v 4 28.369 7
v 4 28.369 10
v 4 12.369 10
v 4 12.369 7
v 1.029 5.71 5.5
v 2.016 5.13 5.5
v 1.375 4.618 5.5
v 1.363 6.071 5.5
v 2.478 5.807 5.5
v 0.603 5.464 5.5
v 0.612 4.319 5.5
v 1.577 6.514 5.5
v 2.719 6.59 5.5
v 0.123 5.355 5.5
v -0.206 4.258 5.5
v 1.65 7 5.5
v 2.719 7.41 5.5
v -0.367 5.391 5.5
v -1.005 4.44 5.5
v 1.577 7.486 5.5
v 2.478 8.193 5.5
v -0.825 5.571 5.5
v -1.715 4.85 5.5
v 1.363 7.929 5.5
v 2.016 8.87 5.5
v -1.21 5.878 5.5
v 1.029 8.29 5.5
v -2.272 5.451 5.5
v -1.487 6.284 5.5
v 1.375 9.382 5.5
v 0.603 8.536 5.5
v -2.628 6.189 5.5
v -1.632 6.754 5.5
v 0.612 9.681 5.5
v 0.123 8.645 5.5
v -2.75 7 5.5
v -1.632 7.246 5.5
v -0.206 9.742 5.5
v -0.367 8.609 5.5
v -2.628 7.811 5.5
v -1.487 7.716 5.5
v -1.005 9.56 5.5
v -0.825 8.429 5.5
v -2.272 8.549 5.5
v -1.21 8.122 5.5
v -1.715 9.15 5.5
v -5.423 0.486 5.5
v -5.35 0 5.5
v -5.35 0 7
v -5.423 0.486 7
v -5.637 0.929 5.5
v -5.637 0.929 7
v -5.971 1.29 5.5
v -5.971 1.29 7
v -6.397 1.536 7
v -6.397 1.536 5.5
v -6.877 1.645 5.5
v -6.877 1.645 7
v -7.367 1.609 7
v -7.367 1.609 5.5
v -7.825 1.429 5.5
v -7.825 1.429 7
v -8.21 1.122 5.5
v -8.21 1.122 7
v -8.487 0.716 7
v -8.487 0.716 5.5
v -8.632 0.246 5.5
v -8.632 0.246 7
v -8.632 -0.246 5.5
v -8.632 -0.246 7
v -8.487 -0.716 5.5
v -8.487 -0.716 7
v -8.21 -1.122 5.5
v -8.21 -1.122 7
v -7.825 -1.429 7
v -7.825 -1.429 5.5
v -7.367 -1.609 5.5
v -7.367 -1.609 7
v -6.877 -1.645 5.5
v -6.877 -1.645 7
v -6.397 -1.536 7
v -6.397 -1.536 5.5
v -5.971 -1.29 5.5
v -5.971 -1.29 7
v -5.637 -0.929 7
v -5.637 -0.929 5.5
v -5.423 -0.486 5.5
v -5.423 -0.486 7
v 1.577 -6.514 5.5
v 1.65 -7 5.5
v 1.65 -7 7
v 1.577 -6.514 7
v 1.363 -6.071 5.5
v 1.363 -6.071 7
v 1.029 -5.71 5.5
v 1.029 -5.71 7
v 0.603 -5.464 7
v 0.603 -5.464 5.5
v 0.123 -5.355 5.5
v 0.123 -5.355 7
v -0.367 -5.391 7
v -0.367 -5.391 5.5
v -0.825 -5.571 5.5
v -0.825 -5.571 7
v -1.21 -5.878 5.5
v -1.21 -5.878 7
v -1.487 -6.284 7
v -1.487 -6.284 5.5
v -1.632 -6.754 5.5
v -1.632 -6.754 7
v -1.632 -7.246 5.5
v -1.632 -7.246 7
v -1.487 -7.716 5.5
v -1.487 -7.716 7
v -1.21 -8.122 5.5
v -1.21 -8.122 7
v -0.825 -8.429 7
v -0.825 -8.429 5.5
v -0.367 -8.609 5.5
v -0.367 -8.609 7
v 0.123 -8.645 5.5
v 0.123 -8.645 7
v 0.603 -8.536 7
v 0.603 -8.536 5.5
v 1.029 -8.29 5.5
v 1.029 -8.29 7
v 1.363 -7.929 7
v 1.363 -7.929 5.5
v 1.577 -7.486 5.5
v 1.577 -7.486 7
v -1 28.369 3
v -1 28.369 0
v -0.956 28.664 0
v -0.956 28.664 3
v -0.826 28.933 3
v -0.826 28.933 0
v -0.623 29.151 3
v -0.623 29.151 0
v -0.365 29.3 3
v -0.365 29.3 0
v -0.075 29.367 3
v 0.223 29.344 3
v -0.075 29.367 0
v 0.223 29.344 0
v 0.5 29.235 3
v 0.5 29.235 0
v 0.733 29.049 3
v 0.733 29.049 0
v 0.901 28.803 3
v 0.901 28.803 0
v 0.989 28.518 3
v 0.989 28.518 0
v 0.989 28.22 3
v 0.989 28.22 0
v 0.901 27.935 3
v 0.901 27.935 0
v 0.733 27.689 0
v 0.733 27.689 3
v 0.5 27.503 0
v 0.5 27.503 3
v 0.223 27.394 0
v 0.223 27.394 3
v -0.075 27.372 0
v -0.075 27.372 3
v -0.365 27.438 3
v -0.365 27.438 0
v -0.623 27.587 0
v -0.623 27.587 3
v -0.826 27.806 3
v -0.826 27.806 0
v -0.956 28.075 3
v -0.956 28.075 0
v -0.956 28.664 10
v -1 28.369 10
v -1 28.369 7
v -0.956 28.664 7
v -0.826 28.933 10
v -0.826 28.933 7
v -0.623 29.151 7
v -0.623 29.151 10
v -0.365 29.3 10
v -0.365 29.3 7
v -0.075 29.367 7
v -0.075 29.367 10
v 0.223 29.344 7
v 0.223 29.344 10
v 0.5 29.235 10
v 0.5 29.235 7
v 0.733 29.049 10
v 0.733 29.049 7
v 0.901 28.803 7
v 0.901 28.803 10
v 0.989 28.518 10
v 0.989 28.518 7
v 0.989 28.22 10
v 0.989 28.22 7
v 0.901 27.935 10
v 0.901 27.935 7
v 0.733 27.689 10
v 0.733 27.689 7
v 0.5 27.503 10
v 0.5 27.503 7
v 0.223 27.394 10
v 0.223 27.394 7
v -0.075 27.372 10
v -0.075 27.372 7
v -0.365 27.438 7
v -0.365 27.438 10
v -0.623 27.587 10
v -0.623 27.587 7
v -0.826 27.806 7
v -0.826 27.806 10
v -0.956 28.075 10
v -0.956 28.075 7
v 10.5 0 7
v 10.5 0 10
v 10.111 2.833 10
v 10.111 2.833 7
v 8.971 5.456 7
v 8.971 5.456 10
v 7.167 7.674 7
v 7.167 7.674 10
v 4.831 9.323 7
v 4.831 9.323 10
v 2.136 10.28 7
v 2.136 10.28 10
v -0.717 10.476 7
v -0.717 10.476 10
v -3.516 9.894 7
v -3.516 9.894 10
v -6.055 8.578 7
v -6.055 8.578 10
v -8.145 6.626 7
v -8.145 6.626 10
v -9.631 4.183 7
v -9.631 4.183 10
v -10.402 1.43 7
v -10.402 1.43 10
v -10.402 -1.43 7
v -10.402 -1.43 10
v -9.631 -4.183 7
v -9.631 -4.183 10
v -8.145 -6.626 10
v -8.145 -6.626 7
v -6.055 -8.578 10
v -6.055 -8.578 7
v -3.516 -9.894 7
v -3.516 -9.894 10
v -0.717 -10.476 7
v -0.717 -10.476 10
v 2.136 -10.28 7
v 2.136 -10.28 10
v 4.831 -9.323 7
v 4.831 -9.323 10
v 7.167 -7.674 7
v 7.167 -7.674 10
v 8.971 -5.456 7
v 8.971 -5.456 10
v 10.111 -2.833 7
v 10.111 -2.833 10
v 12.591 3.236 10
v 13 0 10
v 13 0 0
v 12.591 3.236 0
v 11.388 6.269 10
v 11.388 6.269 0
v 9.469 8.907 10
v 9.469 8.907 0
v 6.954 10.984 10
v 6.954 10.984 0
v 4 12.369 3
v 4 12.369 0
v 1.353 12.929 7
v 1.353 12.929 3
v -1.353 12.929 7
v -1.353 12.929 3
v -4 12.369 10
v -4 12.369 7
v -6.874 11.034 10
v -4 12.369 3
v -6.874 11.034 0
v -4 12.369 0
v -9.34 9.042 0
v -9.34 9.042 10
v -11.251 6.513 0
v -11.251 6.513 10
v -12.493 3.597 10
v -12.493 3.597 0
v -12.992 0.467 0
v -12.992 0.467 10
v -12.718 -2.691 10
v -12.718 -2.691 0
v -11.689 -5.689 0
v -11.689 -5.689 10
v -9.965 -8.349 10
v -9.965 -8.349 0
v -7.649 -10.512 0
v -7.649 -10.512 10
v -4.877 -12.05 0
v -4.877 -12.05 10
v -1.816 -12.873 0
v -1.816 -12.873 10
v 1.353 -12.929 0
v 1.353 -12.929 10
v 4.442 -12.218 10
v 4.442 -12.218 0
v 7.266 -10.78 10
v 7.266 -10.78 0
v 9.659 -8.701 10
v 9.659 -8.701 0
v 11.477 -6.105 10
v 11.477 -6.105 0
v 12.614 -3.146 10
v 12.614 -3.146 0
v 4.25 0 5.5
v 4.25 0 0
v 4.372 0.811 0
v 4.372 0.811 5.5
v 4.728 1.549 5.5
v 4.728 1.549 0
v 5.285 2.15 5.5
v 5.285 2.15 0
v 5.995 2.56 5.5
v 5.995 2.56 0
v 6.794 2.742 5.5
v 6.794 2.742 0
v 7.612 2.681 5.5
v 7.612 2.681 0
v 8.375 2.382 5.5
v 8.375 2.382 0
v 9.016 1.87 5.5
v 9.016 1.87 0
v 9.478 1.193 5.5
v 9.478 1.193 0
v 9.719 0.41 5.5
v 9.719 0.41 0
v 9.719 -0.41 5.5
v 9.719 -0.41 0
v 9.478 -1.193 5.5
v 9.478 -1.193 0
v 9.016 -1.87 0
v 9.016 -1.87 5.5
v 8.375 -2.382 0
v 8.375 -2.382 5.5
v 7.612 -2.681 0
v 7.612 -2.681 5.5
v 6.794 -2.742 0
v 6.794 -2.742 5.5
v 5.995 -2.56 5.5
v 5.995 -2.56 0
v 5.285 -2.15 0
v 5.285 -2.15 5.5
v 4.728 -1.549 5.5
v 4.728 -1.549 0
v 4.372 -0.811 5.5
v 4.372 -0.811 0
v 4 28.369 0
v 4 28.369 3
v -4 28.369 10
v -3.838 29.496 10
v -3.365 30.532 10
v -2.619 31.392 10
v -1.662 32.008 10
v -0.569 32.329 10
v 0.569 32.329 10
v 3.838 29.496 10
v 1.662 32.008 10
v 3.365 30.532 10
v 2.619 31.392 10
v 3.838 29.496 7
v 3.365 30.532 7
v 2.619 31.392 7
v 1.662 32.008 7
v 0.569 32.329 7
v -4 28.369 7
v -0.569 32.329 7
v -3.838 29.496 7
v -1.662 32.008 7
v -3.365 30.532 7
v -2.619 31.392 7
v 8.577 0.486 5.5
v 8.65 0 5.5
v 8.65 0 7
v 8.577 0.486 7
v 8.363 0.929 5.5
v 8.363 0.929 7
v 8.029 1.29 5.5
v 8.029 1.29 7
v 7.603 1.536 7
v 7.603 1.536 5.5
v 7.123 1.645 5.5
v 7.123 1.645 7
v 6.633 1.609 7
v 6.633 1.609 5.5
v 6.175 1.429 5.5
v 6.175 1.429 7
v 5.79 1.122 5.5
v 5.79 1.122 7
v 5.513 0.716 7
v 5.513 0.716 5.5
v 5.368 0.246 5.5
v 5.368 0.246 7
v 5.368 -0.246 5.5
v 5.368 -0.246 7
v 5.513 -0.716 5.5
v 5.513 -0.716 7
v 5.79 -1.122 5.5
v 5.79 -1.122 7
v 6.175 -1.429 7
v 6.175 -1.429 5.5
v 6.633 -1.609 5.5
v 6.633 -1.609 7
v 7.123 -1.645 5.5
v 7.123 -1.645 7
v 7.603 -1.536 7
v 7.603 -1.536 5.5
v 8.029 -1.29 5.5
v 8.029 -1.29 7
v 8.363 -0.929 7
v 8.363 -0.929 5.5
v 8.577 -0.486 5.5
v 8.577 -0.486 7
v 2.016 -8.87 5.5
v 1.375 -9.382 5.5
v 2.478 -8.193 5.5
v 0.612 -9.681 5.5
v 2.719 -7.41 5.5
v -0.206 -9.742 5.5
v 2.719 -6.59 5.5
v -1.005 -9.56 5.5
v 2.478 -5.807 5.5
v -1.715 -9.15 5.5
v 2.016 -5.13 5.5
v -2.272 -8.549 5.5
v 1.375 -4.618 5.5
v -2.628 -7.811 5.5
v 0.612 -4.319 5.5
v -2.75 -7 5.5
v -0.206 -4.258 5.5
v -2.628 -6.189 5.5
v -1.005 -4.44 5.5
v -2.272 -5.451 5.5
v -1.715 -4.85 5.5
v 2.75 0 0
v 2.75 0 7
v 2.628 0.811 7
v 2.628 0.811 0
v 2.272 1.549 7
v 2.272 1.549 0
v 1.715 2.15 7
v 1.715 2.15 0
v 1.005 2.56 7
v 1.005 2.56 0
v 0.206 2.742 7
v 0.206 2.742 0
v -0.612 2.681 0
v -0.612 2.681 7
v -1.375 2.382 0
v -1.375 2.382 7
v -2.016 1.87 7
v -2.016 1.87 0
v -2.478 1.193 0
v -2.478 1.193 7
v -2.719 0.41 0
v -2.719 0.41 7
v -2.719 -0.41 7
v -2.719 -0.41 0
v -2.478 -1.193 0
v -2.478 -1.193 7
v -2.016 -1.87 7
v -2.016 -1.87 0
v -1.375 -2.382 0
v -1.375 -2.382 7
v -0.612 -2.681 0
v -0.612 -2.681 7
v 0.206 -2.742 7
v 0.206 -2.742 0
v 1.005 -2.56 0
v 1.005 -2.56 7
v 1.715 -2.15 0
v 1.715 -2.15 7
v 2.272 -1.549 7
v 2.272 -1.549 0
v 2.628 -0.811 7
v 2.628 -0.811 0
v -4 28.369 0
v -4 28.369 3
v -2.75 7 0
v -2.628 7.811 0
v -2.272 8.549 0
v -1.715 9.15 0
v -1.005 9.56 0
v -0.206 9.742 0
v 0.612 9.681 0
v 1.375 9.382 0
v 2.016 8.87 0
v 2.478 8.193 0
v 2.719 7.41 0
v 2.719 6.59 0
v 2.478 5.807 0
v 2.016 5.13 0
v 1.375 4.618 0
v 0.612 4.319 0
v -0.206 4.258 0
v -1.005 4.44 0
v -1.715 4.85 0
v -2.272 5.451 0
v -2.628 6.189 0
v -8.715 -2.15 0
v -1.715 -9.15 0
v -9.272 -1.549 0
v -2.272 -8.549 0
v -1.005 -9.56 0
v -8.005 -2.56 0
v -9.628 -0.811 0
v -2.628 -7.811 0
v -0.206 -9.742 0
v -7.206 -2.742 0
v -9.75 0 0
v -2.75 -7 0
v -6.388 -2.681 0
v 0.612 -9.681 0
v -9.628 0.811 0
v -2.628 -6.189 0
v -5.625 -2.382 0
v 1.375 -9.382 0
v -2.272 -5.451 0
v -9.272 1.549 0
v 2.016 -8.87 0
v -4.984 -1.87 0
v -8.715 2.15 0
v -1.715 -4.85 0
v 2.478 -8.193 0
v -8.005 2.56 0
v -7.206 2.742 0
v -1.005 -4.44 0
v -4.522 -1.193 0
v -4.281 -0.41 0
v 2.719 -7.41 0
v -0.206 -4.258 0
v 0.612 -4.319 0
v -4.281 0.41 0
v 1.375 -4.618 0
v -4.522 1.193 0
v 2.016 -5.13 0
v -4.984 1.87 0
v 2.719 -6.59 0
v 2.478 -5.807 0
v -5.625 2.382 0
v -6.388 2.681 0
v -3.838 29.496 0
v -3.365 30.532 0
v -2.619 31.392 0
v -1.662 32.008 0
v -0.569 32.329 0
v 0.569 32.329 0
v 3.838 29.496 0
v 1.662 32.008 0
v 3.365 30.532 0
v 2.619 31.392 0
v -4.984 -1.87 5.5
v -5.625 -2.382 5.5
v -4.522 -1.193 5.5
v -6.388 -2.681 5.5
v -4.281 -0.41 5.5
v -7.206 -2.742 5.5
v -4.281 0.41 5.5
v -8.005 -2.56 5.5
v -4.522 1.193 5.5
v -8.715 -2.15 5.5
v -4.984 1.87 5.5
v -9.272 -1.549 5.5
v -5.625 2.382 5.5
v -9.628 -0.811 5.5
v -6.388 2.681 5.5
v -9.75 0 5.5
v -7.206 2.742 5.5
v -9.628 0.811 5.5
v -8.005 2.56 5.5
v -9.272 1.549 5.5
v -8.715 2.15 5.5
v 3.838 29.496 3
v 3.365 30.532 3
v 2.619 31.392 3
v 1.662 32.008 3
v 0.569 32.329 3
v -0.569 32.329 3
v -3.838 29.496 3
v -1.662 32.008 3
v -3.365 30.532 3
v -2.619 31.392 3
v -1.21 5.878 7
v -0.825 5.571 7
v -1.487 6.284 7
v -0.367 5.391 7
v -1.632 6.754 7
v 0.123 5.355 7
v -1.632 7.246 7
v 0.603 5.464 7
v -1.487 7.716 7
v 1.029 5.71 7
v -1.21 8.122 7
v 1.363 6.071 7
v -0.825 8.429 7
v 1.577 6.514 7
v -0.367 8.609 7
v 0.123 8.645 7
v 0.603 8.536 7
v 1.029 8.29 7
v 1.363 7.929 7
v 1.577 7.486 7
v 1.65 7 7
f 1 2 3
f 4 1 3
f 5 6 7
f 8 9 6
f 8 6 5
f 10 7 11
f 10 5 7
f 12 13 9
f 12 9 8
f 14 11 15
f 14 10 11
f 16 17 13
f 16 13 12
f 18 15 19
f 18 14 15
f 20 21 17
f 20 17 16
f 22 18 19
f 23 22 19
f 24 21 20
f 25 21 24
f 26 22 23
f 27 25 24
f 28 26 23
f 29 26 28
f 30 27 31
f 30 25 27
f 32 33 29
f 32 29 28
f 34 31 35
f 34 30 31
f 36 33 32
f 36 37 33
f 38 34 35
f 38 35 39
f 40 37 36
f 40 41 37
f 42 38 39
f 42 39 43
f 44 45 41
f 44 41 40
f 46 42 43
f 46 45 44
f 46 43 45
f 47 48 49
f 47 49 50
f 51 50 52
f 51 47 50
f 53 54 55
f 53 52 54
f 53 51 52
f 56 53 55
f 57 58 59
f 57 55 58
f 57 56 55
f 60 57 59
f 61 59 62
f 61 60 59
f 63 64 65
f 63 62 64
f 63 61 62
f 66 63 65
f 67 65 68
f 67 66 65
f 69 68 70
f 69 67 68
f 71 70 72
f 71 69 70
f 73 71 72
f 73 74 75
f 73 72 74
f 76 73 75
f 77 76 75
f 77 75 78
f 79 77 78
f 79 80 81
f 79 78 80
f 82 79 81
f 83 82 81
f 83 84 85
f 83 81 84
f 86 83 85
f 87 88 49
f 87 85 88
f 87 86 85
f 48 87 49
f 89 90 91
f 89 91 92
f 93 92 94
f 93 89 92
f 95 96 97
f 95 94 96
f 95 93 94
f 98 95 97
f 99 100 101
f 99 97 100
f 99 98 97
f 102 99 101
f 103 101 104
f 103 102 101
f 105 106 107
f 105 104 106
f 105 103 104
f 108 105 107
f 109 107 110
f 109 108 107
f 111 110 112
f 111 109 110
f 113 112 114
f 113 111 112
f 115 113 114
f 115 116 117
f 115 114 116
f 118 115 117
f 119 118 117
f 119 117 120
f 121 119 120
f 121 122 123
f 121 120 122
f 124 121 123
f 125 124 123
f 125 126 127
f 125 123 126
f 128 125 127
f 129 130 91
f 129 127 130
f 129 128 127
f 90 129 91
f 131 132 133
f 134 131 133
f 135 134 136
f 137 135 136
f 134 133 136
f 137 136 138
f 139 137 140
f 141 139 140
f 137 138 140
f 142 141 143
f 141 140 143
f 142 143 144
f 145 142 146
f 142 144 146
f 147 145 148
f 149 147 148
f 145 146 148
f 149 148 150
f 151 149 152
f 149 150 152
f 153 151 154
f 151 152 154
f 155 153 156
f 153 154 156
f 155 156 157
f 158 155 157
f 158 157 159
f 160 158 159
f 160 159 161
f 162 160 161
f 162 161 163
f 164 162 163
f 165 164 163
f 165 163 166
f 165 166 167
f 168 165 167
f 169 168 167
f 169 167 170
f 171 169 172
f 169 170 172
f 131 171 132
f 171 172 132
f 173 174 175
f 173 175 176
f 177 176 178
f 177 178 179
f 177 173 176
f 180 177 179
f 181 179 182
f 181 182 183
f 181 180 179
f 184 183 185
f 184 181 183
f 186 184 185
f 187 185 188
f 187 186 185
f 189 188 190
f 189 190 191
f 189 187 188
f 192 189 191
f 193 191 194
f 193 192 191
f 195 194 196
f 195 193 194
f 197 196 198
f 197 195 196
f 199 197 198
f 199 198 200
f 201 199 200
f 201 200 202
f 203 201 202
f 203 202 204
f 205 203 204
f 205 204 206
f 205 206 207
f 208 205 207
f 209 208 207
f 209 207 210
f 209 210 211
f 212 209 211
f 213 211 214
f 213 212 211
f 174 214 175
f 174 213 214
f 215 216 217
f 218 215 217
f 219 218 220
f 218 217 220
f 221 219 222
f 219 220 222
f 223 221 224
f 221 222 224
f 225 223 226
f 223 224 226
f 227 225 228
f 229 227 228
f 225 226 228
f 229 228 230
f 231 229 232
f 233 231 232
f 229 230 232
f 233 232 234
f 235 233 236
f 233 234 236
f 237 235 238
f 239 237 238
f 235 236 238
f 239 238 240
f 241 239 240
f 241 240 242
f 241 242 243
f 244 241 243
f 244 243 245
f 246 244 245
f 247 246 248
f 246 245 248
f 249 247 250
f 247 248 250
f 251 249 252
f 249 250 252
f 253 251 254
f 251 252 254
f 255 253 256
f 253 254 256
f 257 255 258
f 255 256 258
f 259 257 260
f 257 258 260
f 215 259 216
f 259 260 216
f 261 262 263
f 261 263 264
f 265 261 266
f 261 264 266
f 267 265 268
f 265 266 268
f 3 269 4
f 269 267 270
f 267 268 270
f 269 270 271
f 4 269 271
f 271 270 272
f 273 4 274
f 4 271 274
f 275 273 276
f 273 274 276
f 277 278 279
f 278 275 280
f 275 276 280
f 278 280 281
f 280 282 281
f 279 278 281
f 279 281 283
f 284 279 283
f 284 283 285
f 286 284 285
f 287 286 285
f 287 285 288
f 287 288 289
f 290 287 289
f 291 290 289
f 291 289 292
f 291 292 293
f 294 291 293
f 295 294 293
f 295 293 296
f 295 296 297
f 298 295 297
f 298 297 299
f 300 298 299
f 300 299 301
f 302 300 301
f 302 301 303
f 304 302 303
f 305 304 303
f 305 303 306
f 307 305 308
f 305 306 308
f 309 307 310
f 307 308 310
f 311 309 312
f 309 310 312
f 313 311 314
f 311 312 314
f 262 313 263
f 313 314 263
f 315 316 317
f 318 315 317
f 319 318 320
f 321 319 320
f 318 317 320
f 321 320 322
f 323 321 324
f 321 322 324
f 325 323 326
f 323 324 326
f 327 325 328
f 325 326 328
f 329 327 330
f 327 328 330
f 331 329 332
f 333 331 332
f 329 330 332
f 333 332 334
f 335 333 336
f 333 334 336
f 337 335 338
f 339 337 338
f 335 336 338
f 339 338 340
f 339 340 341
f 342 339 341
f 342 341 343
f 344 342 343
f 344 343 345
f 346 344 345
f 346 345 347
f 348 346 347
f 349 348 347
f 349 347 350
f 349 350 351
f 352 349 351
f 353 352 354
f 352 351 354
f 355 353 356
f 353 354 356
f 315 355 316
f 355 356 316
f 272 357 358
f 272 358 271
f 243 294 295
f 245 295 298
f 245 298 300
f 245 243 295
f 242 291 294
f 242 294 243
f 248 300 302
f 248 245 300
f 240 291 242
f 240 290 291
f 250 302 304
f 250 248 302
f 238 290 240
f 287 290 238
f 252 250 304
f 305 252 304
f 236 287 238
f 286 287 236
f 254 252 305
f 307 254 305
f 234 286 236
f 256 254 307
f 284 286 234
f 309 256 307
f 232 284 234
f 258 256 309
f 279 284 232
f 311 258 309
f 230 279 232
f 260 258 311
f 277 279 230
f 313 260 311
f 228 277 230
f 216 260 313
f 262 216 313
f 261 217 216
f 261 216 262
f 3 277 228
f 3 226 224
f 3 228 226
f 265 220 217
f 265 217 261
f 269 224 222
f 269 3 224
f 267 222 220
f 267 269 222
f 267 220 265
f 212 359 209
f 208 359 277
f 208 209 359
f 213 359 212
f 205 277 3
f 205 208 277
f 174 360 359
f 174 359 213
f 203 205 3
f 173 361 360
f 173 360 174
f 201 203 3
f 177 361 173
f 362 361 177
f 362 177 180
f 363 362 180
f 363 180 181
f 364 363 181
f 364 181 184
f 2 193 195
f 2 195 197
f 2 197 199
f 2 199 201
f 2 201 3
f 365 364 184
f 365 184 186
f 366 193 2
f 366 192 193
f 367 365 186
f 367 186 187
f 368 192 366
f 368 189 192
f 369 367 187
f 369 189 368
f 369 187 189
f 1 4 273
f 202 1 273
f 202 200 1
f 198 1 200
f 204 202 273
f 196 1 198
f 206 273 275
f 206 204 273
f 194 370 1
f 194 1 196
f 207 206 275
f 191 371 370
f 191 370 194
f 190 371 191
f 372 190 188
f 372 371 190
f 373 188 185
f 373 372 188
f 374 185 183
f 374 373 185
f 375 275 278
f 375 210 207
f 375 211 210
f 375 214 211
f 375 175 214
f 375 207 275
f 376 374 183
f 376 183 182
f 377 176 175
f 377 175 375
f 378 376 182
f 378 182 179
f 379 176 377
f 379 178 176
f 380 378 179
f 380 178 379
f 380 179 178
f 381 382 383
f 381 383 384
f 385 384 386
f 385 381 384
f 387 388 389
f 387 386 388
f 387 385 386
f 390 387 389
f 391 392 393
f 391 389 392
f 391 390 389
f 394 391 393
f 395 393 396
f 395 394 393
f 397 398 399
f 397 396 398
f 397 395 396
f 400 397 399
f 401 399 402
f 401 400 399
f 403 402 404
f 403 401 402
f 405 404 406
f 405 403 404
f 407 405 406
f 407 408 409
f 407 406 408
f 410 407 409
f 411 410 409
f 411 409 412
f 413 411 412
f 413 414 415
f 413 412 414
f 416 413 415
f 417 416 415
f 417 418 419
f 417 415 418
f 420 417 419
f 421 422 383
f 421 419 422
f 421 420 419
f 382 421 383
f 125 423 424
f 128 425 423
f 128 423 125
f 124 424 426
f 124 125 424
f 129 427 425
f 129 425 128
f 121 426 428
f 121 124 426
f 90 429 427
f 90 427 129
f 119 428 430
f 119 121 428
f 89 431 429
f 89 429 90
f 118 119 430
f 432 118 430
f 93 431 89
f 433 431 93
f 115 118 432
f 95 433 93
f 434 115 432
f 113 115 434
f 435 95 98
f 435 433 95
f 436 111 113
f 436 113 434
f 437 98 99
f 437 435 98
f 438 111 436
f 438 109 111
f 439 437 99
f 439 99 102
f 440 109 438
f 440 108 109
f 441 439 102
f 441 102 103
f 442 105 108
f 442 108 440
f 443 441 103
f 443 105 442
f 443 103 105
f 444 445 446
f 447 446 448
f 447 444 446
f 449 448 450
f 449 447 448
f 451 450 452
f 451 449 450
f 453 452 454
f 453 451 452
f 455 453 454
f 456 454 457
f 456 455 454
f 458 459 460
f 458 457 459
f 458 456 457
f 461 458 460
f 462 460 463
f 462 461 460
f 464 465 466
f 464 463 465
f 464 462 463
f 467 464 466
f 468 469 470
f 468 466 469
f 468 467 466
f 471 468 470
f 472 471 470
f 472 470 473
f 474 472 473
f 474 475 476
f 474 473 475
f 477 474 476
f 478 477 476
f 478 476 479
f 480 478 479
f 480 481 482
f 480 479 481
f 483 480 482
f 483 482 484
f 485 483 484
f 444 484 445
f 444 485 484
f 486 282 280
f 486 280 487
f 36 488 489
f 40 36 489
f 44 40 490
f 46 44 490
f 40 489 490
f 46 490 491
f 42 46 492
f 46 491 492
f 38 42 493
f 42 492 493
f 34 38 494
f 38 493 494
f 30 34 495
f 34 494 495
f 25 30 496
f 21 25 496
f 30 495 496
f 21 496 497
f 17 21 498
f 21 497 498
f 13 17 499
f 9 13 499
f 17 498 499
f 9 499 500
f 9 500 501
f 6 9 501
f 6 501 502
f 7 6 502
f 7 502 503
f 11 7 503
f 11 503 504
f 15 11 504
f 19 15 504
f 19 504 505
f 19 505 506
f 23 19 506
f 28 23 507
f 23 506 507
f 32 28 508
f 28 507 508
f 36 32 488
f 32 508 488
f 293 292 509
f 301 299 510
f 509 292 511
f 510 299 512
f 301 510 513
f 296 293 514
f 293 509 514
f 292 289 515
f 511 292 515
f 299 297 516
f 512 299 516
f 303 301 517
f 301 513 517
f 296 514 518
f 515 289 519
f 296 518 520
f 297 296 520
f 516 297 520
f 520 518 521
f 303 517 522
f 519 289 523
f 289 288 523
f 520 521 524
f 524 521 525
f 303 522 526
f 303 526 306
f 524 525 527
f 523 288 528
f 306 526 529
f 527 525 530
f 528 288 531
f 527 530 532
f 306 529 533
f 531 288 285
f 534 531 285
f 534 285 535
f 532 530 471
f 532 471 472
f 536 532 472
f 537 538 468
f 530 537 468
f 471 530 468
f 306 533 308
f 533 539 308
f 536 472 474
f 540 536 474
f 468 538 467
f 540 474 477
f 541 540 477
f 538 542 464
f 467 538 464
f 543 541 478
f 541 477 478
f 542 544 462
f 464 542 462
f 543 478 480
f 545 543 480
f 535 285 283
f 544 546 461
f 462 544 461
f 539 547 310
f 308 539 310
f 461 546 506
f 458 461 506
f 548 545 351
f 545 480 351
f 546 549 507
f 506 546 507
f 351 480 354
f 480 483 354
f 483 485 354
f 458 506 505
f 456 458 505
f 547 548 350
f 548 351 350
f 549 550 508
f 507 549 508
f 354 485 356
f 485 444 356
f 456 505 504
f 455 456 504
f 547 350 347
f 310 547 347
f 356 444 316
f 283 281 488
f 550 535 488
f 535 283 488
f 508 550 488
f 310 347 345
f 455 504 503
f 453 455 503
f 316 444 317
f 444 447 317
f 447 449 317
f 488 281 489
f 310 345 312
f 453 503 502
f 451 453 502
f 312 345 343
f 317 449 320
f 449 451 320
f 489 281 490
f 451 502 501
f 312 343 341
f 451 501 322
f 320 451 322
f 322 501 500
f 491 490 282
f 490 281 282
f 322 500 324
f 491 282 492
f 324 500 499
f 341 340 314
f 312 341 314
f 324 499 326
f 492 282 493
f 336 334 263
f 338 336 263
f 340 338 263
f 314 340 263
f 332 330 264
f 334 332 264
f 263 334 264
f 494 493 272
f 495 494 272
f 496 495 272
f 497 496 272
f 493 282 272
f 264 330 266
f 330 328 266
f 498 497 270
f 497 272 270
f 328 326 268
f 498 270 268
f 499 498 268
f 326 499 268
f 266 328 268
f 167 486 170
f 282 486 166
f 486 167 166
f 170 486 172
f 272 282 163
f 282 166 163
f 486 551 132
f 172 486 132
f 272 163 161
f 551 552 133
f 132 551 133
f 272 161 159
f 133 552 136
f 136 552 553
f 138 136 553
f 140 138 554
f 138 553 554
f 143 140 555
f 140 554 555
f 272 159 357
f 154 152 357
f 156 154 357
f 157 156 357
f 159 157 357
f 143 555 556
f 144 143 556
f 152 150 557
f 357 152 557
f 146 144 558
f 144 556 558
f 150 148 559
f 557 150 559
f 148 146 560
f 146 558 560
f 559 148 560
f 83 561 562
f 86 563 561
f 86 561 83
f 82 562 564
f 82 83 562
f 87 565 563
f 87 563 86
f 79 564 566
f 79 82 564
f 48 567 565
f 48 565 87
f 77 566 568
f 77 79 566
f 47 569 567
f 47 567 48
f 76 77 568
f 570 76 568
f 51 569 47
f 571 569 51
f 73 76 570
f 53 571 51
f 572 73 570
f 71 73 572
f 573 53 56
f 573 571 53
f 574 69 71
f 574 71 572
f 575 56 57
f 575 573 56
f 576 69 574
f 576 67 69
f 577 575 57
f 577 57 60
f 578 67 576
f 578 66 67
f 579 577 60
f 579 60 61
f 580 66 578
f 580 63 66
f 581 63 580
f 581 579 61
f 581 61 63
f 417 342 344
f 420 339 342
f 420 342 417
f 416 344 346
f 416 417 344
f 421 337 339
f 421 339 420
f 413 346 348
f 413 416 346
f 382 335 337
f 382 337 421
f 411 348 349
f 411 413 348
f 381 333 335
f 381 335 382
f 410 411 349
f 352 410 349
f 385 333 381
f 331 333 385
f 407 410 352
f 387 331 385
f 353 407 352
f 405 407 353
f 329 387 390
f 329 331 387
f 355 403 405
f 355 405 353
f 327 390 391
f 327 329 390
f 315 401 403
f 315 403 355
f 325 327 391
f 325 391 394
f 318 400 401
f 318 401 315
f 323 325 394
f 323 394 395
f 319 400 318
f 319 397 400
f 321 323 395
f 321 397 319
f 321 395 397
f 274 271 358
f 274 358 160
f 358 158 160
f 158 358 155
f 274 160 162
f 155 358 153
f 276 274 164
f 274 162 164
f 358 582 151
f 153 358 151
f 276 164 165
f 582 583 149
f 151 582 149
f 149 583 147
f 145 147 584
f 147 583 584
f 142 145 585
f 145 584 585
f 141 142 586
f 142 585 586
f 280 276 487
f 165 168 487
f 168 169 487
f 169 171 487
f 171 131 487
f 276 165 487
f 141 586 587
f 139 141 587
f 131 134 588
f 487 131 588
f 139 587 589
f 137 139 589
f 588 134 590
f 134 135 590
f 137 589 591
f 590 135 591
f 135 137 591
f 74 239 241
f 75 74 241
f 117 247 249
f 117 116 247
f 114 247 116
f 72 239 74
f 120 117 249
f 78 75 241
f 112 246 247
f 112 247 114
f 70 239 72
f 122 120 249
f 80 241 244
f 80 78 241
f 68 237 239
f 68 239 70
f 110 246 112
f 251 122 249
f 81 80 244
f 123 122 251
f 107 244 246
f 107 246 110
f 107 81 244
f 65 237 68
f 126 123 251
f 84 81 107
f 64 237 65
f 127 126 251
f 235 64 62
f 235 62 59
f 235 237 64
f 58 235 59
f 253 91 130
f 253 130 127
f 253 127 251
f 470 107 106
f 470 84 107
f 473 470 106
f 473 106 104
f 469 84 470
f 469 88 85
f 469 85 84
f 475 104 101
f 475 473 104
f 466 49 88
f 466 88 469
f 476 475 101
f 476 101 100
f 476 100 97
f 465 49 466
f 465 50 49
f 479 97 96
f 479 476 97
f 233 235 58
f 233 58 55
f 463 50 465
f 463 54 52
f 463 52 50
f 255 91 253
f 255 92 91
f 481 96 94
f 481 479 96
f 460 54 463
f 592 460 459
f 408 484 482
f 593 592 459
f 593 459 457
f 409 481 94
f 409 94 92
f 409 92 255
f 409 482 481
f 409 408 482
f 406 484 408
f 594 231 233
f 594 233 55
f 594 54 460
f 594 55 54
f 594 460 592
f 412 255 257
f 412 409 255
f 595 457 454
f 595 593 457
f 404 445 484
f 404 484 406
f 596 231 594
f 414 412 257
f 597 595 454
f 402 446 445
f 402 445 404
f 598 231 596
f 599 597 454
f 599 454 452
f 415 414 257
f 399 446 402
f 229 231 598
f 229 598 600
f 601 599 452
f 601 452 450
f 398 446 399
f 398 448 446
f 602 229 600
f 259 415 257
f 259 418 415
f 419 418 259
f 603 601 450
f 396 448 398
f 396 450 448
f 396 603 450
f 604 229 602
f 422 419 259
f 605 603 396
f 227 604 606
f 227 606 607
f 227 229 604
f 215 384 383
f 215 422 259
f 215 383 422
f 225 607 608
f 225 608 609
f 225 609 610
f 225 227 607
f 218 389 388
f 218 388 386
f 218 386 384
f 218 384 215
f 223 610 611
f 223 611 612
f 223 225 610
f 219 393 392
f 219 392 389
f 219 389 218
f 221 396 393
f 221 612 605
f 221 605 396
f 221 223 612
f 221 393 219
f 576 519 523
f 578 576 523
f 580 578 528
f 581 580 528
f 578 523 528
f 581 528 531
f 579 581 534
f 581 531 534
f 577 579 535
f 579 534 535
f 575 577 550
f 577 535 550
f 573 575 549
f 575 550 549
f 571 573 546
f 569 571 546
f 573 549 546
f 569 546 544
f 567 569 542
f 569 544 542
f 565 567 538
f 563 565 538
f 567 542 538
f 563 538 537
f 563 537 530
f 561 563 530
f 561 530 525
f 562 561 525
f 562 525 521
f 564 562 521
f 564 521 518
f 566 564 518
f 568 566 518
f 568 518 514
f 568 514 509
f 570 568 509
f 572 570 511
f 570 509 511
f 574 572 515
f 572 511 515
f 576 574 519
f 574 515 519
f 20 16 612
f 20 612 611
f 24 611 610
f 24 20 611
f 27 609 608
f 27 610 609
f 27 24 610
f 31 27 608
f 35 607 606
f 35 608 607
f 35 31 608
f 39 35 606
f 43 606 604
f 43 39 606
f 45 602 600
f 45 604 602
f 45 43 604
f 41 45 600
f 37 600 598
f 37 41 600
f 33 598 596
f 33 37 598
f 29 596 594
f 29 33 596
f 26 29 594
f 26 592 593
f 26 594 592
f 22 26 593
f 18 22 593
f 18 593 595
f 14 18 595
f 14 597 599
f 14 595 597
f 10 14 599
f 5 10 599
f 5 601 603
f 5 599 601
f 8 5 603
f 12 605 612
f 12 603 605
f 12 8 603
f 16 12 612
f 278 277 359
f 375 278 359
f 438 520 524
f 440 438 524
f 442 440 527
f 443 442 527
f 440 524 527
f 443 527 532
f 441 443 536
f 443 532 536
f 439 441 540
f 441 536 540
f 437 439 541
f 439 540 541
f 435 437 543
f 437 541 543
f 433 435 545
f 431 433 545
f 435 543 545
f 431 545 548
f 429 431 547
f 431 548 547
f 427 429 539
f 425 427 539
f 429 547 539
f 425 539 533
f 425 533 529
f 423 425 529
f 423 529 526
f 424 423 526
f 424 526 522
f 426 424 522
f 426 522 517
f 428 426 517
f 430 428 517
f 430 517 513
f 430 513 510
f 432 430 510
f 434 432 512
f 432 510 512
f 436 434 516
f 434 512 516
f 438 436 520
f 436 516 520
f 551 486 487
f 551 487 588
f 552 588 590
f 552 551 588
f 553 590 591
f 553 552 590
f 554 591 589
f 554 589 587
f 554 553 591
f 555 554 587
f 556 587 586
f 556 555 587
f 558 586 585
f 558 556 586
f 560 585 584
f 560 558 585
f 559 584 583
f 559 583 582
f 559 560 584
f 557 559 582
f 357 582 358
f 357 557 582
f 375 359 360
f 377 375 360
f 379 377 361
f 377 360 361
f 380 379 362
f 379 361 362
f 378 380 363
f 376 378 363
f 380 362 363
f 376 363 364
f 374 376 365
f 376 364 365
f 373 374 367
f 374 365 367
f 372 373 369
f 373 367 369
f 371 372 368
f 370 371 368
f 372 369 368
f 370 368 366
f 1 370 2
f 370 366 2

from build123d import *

# Parameters (mm, degrees)
ESQUISSE1_R             = 13
ESQUISSE1_R_2           = 2.75
ESQUISSE1_R_3           = 1.65
BOSS_EXTRU_1_DEPTH      = 10
ESQUISSE2_R             = 10.5
ENL_V_MAT_EXTRU_1_DEPTH = 3
ESQUISSE3_R             = 2.75
ENL_V_MAT_EXTRU_2_DEPTH = 5.5
ESQUISSE4_R             = 1
BOSS_EXTRU_2_DEPTH      = 3


with BuildPart() as part:
    # Esquisse1 → Boss.-Extru.1 (new body)
    with BuildSketch(Plane.XY):
        Circle(ESQUISSE1_R)
        Circle(ESQUISSE1_R_2, mode=Mode.SUBTRACT)
        with Locations((-7, 0)):
            Circle(ESQUISSE1_R_3, mode=Mode.SUBTRACT)
        with Locations((0, 7)):
            Circle(ESQUISSE1_R_3, mode=Mode.SUBTRACT)
        with Locations((7, 0)):
            Circle(ESQUISSE1_R_3, mode=Mode.SUBTRACT)
        with Locations((0, -7)):
            Circle(ESQUISSE1_R_3, mode=Mode.SUBTRACT)
    extrude(amount=BOSS_EXTRU_1_DEPTH)

    # Esquisse2 → Enlèv. mat.-Extru.1 (cut)
    with BuildSketch(Plane.XY.offset(10)):
        Circle(ESQUISSE2_R)
    extrude(amount=-ENL_V_MAT_EXTRU_1_DEPTH, mode=Mode.SUBTRACT)

    # Esquisse3 → Enlèv. mat.-Extru.2 (cut)
    with BuildSketch(Plane(origin=(0, 0, 0), x_dir=(-1, 0, 0), z_dir=(0, 0, -1))):
        with Locations((-7, 0)):
            Circle(ESQUISSE3_R)
        with Locations((0, 7)):
            Circle(ESQUISSE3_R)
        with Locations((7, 0)):
            Circle(ESQUISSE3_R)
        with Locations((0, -7)):
            Circle(ESQUISSE3_R)
    extrude(amount=-ENL_V_MAT_EXTRU_2_DEPTH, mode=Mode.SUBTRACT)

    # Esquisse4 → Boss.-Extru.2 (add)
    with BuildSketch(Plane(origin=(0, 0, 0), x_dir=(-1, 0, 0), z_dir=(0, 0, -1))):
        with BuildLine():
            Line((-4, 28.369316877), (-4, 12.369316877))
            ThreePointArc((-4, 12.369316877), (0, 13), (4, 12.369316877))
            Line((4, 12.369316877), (4, 28.369316877))
            ThreePointArc((4, 28.369316877), (0, 32.369316877), (-4, 28.369316877))
        make_face()
        with Locations((0, 28.369316877)):
            Circle(ESQUISSE4_R, mode=Mode.SUBTRACT)
    boss_extru_2 = extrude(amount=-BOSS_EXTRU_2_DEPTH)

    # Symétrie1: Boss.-Extru.2 across plane
    add(boss_extru_2.mirror(Plane.XY.offset(5)))


solid = part.part
